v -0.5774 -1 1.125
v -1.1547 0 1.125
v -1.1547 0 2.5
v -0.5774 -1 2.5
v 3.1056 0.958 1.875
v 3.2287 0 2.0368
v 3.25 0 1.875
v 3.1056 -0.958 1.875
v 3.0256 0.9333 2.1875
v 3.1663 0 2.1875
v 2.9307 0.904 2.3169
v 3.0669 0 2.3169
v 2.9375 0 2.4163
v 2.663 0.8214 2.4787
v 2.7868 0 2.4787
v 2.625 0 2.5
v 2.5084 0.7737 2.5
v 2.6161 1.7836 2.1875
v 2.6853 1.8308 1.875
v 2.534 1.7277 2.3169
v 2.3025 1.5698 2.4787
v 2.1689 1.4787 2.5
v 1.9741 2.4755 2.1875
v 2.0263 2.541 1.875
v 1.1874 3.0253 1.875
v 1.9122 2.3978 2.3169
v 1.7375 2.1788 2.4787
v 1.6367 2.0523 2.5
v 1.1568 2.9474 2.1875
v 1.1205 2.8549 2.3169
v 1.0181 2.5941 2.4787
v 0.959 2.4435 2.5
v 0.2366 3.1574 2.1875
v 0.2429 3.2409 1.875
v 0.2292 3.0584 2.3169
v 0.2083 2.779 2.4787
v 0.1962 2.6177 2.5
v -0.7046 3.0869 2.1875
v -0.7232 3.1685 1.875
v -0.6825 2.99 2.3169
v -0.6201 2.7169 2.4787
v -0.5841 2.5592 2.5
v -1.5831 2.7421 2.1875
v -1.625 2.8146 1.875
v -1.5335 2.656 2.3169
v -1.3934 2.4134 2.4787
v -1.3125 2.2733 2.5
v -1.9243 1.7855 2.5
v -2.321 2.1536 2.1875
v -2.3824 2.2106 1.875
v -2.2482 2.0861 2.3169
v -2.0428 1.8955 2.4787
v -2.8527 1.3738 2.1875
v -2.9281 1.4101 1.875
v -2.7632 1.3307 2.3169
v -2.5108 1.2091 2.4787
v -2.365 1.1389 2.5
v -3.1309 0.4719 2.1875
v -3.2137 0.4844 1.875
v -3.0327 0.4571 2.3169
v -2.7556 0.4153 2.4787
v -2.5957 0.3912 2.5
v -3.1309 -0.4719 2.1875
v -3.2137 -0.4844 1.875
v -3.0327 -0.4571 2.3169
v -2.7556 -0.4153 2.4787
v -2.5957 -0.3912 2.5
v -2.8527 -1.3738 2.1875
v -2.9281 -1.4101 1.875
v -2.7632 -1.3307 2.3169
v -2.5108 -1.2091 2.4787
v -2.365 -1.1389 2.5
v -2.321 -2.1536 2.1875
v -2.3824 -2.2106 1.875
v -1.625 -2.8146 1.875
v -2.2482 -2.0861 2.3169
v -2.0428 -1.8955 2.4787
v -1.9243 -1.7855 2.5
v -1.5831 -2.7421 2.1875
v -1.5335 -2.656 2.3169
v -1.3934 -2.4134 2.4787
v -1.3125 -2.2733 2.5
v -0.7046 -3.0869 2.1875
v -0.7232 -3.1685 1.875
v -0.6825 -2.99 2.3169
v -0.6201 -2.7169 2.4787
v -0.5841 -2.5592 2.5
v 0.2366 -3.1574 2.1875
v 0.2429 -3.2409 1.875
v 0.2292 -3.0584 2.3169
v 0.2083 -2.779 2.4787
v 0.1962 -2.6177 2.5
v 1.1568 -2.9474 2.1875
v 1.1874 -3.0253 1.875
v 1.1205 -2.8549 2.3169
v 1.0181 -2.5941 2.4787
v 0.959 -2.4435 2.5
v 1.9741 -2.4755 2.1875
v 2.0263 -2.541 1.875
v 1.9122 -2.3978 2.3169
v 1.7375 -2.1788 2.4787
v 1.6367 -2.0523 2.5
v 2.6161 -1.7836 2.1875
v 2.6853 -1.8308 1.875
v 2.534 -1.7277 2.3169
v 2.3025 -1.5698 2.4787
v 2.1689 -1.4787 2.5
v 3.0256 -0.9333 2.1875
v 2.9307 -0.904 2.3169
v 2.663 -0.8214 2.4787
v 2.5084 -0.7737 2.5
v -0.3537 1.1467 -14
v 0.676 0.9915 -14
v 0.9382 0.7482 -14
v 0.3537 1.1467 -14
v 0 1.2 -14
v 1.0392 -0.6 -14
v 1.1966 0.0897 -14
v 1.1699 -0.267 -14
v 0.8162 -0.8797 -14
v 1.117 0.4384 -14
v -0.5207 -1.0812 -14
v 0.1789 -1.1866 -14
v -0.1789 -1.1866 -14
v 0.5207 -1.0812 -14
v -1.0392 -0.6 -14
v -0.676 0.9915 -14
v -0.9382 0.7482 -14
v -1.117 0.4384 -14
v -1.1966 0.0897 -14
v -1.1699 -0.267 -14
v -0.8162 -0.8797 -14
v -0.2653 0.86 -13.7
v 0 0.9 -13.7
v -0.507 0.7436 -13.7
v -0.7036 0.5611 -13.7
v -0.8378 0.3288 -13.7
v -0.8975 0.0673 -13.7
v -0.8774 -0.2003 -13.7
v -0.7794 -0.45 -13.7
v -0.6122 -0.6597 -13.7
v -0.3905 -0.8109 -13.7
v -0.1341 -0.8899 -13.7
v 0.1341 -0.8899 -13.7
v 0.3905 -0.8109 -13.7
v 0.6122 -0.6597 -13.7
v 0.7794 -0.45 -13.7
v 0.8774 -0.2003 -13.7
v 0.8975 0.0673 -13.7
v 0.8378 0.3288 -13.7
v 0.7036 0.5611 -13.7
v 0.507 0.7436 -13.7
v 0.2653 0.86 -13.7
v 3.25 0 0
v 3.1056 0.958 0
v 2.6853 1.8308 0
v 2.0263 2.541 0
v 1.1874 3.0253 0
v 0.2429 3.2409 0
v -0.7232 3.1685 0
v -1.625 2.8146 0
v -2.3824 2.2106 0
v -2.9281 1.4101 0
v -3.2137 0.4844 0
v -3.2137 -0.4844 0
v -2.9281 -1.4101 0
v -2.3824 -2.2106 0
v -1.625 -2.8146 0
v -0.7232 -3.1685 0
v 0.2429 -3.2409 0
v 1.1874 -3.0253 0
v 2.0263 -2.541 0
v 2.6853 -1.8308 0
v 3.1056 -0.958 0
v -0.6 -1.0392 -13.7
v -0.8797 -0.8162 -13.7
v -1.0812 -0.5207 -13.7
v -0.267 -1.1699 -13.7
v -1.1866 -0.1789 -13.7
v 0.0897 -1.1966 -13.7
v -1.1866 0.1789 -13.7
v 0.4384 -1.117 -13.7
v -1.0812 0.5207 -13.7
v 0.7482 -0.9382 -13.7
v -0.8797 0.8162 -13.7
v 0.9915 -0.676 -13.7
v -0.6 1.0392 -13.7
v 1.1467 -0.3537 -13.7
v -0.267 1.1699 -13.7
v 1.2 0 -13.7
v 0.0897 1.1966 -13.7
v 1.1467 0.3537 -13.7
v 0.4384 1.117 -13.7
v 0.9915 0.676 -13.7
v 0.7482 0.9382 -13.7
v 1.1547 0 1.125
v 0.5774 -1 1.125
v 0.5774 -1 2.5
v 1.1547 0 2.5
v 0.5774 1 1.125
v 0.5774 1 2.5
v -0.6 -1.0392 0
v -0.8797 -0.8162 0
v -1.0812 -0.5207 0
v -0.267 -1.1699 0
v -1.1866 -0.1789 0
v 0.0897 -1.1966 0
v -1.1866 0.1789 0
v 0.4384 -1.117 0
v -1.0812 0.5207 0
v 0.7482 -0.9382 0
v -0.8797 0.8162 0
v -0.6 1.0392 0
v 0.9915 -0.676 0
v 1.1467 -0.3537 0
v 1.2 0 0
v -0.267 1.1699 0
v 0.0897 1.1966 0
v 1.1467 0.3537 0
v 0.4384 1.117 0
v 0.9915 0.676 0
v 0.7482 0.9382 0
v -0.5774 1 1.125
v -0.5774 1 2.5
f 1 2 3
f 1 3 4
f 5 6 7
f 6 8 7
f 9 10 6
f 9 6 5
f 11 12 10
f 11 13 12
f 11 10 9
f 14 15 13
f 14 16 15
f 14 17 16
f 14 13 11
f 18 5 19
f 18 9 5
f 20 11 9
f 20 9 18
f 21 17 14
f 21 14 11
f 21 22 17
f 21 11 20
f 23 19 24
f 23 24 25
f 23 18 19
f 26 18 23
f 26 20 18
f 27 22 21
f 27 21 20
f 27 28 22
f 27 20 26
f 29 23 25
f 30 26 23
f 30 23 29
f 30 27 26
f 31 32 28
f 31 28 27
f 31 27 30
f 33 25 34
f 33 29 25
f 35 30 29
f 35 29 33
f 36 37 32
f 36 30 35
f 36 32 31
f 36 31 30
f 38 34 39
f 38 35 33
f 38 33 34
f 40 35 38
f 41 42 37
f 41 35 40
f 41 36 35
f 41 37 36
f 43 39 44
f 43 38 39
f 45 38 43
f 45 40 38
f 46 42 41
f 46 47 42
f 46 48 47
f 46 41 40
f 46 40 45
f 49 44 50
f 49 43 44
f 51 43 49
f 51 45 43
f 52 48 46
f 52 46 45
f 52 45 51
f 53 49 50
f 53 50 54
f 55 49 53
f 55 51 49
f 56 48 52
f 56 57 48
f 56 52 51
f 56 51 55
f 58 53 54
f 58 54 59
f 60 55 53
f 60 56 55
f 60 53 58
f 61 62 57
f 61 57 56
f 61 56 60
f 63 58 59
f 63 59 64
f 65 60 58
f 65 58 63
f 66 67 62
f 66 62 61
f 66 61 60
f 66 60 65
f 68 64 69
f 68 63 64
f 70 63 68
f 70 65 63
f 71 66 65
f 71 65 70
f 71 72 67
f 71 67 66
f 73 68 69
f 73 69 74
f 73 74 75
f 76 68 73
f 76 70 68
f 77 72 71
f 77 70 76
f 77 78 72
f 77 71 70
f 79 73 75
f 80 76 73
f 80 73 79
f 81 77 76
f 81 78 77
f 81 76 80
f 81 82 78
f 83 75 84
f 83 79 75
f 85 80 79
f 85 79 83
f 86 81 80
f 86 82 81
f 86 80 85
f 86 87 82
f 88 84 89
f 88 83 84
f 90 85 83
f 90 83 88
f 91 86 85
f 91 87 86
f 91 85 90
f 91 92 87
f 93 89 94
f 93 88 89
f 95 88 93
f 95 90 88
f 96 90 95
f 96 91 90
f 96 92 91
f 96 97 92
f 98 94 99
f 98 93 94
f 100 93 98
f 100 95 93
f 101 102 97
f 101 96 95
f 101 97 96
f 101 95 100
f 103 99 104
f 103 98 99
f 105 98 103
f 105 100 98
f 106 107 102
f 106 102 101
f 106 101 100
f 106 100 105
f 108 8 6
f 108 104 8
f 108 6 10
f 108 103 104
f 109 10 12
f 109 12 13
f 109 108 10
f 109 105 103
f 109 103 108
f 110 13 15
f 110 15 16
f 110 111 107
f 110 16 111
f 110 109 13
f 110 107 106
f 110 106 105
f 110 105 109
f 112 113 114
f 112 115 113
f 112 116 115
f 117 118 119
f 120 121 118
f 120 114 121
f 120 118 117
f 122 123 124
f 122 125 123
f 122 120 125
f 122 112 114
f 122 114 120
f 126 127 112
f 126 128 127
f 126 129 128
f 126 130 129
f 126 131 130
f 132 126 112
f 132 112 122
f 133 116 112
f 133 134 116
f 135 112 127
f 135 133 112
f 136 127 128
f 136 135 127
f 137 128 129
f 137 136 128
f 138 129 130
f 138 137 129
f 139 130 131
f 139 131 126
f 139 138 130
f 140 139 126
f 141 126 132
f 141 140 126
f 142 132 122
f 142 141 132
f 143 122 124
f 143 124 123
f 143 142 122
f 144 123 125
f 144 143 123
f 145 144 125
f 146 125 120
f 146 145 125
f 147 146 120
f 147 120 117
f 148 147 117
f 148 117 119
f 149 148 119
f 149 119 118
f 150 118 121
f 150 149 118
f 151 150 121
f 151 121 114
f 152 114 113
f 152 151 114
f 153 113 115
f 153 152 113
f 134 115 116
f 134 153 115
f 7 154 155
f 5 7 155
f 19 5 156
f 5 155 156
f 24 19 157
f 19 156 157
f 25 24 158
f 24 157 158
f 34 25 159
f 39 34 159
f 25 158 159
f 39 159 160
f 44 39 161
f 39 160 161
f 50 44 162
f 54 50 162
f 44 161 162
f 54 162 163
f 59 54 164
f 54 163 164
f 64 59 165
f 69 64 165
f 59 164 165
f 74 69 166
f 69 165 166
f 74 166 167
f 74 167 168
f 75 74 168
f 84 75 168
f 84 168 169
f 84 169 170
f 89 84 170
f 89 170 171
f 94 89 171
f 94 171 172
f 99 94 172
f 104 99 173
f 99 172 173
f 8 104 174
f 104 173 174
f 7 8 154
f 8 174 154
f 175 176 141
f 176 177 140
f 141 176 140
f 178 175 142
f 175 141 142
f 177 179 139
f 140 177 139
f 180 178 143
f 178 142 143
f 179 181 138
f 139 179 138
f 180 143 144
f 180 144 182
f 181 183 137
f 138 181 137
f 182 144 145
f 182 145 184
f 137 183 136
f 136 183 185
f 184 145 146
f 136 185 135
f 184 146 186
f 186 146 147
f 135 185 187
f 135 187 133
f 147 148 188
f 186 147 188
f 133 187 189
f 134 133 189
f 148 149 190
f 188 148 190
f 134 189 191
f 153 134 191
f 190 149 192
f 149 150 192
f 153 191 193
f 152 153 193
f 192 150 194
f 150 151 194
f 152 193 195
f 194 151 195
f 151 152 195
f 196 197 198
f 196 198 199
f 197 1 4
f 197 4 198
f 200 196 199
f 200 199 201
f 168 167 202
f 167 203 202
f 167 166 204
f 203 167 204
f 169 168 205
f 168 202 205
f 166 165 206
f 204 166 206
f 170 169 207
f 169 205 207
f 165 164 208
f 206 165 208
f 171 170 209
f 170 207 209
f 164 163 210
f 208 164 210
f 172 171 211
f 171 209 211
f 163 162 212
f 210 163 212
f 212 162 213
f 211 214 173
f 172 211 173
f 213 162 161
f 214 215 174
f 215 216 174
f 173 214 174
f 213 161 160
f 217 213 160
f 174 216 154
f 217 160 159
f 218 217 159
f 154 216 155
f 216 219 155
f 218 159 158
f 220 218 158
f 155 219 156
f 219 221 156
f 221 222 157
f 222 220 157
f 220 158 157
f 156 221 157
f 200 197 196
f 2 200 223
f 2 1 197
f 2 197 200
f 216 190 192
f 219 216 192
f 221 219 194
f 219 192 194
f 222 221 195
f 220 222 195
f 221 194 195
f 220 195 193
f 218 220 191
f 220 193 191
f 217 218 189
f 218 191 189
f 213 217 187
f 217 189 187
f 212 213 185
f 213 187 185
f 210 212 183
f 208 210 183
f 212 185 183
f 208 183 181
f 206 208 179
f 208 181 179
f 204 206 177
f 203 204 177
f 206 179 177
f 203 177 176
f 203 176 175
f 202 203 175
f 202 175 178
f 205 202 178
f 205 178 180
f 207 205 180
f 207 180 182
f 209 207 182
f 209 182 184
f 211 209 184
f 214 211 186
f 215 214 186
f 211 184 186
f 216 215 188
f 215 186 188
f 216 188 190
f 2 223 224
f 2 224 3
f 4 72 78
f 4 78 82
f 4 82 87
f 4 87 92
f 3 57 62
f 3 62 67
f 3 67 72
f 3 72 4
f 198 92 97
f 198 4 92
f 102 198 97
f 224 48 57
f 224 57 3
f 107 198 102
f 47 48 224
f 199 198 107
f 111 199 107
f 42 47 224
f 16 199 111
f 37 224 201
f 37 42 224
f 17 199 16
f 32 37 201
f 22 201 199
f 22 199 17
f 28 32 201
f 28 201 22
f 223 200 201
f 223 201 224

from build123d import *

# Parameters (mm, degrees)
F_0045_CYLINDER_SKETCH_R    = 3.25
F_0045_CYLINDER_DEPTH       = 2.5
F_0046_FILLET_R             = 0.625
F_0047_EXTRUDE_DEPTH        = 1.385
F_0047_EXTRUDE_ROTATE_ANGLE = 120
F_0050_CYLINDER_SKETCH_R    = 1.2
F_0050_CYLINDER_DEPTH       = 13.7
F_0051_CONE_ROTATE_ANGLE    = 90


with BuildPart() as part:
    # 0045_cylinder_Sketch → 0045_cylinder (new body)
    with BuildSketch(Plane.XY):
        Circle(F_0045_CYLINDER_SKETCH_R)
    extrude(amount=F_0045_CYLINDER_DEPTH)

    # 0046_fillet
    f_0046_fillet_edges = [part.edges().sort_by_distance(p)[0] for p in [
        (-3.25, 0, 2.5),
    ]]
    fillet(f_0046_fillet_edges, radius=F_0046_FILLET_R)


with BuildPart() as body_2:
    # 0047_extrude_Sketch → 0047_extrude (new body)
    with BuildSketch(Plane.XY):
        Polygon((0, 0), (1.154700538, 0), (1.732050808, 1), (1.154700538, 2), (0, 2), (-0.577350269, 1), align=None)
    extrude(amount=F_0047_EXTRUDE_DEPTH)


with BuildPart() as body_2_1:
    # 0047_extrude_Rotate: read off the stored shape, not the designer's step
    # 0047_extrude_Rotate: moved
    add(body_2.part.rotate(Axis((0, 0, 0), (0, 0, 1)), F_0047_EXTRUDE_ROTATE_ANGLE))


with BuildPart() as body_2_2:
    # 0047_extrude_Translate: moved
    add(body_2_1.part.moved(Location((1.154700538, 0, 1.125))))


with BuildPart() as part_1:
    add(part.part)

    # 0049_sub: cut body 2
    add(body_2_2.part, mode=Mode.SUBTRACT)


with BuildPart() as body_2_2_1:
    # 0050_cylinder_Sketch → 0050_cylinder (new body)
    with BuildSketch(Plane.XY):
        Circle(F_0050_CYLINDER_SKETCH_R)
    extrude(amount=F_0050_CYLINDER_DEPTH)


with BuildPart() as body_2_2_2:
    # 0050_cylinder_Translate: moved
    add(body_2_2_1.part.moved(Location((0, 0, -13.7))))


with BuildPart() as body_3:
    # 0051_cone_Sketch → 0051_cone (revolve)
    with BuildSketch(Plane.XY, mode=Mode.PRIVATE) as f_0051_cone_sk:
        Polygon((0, 0), (1.2, 0), (0.9, 0.3), (0, 0.3), align=None)
    revolve(f_0051_cone_sk.sketch.rotate(Axis((0, -100, 0), (0, 1, 0)), 90), axis=Axis((0, -100, 0), (0, 1, 0)))


with BuildPart() as body_3_1:
    # 0051_cone_Rotate: moved
    add(body_3.part.rotate(Axis((0, 0, 0), (1, 0, 0)), F_0051_CONE_ROTATE_ANGLE))


with BuildPart() as body_3_2:
    # 0051_cone_Translate: moved
    add(body_3_1.part.moved(Location((0, 0, -14))))


with BuildPart() as body_2_2_3:
    add(body_2_2_2.part)

    # 0053_add: union body 3
    add(body_3_2.part)


with BuildPart() as part_2:
    add(part_1.part)

    # 0054_add: union body 2 2
    add(body_2_2_3.part)


solid = part_2.part
